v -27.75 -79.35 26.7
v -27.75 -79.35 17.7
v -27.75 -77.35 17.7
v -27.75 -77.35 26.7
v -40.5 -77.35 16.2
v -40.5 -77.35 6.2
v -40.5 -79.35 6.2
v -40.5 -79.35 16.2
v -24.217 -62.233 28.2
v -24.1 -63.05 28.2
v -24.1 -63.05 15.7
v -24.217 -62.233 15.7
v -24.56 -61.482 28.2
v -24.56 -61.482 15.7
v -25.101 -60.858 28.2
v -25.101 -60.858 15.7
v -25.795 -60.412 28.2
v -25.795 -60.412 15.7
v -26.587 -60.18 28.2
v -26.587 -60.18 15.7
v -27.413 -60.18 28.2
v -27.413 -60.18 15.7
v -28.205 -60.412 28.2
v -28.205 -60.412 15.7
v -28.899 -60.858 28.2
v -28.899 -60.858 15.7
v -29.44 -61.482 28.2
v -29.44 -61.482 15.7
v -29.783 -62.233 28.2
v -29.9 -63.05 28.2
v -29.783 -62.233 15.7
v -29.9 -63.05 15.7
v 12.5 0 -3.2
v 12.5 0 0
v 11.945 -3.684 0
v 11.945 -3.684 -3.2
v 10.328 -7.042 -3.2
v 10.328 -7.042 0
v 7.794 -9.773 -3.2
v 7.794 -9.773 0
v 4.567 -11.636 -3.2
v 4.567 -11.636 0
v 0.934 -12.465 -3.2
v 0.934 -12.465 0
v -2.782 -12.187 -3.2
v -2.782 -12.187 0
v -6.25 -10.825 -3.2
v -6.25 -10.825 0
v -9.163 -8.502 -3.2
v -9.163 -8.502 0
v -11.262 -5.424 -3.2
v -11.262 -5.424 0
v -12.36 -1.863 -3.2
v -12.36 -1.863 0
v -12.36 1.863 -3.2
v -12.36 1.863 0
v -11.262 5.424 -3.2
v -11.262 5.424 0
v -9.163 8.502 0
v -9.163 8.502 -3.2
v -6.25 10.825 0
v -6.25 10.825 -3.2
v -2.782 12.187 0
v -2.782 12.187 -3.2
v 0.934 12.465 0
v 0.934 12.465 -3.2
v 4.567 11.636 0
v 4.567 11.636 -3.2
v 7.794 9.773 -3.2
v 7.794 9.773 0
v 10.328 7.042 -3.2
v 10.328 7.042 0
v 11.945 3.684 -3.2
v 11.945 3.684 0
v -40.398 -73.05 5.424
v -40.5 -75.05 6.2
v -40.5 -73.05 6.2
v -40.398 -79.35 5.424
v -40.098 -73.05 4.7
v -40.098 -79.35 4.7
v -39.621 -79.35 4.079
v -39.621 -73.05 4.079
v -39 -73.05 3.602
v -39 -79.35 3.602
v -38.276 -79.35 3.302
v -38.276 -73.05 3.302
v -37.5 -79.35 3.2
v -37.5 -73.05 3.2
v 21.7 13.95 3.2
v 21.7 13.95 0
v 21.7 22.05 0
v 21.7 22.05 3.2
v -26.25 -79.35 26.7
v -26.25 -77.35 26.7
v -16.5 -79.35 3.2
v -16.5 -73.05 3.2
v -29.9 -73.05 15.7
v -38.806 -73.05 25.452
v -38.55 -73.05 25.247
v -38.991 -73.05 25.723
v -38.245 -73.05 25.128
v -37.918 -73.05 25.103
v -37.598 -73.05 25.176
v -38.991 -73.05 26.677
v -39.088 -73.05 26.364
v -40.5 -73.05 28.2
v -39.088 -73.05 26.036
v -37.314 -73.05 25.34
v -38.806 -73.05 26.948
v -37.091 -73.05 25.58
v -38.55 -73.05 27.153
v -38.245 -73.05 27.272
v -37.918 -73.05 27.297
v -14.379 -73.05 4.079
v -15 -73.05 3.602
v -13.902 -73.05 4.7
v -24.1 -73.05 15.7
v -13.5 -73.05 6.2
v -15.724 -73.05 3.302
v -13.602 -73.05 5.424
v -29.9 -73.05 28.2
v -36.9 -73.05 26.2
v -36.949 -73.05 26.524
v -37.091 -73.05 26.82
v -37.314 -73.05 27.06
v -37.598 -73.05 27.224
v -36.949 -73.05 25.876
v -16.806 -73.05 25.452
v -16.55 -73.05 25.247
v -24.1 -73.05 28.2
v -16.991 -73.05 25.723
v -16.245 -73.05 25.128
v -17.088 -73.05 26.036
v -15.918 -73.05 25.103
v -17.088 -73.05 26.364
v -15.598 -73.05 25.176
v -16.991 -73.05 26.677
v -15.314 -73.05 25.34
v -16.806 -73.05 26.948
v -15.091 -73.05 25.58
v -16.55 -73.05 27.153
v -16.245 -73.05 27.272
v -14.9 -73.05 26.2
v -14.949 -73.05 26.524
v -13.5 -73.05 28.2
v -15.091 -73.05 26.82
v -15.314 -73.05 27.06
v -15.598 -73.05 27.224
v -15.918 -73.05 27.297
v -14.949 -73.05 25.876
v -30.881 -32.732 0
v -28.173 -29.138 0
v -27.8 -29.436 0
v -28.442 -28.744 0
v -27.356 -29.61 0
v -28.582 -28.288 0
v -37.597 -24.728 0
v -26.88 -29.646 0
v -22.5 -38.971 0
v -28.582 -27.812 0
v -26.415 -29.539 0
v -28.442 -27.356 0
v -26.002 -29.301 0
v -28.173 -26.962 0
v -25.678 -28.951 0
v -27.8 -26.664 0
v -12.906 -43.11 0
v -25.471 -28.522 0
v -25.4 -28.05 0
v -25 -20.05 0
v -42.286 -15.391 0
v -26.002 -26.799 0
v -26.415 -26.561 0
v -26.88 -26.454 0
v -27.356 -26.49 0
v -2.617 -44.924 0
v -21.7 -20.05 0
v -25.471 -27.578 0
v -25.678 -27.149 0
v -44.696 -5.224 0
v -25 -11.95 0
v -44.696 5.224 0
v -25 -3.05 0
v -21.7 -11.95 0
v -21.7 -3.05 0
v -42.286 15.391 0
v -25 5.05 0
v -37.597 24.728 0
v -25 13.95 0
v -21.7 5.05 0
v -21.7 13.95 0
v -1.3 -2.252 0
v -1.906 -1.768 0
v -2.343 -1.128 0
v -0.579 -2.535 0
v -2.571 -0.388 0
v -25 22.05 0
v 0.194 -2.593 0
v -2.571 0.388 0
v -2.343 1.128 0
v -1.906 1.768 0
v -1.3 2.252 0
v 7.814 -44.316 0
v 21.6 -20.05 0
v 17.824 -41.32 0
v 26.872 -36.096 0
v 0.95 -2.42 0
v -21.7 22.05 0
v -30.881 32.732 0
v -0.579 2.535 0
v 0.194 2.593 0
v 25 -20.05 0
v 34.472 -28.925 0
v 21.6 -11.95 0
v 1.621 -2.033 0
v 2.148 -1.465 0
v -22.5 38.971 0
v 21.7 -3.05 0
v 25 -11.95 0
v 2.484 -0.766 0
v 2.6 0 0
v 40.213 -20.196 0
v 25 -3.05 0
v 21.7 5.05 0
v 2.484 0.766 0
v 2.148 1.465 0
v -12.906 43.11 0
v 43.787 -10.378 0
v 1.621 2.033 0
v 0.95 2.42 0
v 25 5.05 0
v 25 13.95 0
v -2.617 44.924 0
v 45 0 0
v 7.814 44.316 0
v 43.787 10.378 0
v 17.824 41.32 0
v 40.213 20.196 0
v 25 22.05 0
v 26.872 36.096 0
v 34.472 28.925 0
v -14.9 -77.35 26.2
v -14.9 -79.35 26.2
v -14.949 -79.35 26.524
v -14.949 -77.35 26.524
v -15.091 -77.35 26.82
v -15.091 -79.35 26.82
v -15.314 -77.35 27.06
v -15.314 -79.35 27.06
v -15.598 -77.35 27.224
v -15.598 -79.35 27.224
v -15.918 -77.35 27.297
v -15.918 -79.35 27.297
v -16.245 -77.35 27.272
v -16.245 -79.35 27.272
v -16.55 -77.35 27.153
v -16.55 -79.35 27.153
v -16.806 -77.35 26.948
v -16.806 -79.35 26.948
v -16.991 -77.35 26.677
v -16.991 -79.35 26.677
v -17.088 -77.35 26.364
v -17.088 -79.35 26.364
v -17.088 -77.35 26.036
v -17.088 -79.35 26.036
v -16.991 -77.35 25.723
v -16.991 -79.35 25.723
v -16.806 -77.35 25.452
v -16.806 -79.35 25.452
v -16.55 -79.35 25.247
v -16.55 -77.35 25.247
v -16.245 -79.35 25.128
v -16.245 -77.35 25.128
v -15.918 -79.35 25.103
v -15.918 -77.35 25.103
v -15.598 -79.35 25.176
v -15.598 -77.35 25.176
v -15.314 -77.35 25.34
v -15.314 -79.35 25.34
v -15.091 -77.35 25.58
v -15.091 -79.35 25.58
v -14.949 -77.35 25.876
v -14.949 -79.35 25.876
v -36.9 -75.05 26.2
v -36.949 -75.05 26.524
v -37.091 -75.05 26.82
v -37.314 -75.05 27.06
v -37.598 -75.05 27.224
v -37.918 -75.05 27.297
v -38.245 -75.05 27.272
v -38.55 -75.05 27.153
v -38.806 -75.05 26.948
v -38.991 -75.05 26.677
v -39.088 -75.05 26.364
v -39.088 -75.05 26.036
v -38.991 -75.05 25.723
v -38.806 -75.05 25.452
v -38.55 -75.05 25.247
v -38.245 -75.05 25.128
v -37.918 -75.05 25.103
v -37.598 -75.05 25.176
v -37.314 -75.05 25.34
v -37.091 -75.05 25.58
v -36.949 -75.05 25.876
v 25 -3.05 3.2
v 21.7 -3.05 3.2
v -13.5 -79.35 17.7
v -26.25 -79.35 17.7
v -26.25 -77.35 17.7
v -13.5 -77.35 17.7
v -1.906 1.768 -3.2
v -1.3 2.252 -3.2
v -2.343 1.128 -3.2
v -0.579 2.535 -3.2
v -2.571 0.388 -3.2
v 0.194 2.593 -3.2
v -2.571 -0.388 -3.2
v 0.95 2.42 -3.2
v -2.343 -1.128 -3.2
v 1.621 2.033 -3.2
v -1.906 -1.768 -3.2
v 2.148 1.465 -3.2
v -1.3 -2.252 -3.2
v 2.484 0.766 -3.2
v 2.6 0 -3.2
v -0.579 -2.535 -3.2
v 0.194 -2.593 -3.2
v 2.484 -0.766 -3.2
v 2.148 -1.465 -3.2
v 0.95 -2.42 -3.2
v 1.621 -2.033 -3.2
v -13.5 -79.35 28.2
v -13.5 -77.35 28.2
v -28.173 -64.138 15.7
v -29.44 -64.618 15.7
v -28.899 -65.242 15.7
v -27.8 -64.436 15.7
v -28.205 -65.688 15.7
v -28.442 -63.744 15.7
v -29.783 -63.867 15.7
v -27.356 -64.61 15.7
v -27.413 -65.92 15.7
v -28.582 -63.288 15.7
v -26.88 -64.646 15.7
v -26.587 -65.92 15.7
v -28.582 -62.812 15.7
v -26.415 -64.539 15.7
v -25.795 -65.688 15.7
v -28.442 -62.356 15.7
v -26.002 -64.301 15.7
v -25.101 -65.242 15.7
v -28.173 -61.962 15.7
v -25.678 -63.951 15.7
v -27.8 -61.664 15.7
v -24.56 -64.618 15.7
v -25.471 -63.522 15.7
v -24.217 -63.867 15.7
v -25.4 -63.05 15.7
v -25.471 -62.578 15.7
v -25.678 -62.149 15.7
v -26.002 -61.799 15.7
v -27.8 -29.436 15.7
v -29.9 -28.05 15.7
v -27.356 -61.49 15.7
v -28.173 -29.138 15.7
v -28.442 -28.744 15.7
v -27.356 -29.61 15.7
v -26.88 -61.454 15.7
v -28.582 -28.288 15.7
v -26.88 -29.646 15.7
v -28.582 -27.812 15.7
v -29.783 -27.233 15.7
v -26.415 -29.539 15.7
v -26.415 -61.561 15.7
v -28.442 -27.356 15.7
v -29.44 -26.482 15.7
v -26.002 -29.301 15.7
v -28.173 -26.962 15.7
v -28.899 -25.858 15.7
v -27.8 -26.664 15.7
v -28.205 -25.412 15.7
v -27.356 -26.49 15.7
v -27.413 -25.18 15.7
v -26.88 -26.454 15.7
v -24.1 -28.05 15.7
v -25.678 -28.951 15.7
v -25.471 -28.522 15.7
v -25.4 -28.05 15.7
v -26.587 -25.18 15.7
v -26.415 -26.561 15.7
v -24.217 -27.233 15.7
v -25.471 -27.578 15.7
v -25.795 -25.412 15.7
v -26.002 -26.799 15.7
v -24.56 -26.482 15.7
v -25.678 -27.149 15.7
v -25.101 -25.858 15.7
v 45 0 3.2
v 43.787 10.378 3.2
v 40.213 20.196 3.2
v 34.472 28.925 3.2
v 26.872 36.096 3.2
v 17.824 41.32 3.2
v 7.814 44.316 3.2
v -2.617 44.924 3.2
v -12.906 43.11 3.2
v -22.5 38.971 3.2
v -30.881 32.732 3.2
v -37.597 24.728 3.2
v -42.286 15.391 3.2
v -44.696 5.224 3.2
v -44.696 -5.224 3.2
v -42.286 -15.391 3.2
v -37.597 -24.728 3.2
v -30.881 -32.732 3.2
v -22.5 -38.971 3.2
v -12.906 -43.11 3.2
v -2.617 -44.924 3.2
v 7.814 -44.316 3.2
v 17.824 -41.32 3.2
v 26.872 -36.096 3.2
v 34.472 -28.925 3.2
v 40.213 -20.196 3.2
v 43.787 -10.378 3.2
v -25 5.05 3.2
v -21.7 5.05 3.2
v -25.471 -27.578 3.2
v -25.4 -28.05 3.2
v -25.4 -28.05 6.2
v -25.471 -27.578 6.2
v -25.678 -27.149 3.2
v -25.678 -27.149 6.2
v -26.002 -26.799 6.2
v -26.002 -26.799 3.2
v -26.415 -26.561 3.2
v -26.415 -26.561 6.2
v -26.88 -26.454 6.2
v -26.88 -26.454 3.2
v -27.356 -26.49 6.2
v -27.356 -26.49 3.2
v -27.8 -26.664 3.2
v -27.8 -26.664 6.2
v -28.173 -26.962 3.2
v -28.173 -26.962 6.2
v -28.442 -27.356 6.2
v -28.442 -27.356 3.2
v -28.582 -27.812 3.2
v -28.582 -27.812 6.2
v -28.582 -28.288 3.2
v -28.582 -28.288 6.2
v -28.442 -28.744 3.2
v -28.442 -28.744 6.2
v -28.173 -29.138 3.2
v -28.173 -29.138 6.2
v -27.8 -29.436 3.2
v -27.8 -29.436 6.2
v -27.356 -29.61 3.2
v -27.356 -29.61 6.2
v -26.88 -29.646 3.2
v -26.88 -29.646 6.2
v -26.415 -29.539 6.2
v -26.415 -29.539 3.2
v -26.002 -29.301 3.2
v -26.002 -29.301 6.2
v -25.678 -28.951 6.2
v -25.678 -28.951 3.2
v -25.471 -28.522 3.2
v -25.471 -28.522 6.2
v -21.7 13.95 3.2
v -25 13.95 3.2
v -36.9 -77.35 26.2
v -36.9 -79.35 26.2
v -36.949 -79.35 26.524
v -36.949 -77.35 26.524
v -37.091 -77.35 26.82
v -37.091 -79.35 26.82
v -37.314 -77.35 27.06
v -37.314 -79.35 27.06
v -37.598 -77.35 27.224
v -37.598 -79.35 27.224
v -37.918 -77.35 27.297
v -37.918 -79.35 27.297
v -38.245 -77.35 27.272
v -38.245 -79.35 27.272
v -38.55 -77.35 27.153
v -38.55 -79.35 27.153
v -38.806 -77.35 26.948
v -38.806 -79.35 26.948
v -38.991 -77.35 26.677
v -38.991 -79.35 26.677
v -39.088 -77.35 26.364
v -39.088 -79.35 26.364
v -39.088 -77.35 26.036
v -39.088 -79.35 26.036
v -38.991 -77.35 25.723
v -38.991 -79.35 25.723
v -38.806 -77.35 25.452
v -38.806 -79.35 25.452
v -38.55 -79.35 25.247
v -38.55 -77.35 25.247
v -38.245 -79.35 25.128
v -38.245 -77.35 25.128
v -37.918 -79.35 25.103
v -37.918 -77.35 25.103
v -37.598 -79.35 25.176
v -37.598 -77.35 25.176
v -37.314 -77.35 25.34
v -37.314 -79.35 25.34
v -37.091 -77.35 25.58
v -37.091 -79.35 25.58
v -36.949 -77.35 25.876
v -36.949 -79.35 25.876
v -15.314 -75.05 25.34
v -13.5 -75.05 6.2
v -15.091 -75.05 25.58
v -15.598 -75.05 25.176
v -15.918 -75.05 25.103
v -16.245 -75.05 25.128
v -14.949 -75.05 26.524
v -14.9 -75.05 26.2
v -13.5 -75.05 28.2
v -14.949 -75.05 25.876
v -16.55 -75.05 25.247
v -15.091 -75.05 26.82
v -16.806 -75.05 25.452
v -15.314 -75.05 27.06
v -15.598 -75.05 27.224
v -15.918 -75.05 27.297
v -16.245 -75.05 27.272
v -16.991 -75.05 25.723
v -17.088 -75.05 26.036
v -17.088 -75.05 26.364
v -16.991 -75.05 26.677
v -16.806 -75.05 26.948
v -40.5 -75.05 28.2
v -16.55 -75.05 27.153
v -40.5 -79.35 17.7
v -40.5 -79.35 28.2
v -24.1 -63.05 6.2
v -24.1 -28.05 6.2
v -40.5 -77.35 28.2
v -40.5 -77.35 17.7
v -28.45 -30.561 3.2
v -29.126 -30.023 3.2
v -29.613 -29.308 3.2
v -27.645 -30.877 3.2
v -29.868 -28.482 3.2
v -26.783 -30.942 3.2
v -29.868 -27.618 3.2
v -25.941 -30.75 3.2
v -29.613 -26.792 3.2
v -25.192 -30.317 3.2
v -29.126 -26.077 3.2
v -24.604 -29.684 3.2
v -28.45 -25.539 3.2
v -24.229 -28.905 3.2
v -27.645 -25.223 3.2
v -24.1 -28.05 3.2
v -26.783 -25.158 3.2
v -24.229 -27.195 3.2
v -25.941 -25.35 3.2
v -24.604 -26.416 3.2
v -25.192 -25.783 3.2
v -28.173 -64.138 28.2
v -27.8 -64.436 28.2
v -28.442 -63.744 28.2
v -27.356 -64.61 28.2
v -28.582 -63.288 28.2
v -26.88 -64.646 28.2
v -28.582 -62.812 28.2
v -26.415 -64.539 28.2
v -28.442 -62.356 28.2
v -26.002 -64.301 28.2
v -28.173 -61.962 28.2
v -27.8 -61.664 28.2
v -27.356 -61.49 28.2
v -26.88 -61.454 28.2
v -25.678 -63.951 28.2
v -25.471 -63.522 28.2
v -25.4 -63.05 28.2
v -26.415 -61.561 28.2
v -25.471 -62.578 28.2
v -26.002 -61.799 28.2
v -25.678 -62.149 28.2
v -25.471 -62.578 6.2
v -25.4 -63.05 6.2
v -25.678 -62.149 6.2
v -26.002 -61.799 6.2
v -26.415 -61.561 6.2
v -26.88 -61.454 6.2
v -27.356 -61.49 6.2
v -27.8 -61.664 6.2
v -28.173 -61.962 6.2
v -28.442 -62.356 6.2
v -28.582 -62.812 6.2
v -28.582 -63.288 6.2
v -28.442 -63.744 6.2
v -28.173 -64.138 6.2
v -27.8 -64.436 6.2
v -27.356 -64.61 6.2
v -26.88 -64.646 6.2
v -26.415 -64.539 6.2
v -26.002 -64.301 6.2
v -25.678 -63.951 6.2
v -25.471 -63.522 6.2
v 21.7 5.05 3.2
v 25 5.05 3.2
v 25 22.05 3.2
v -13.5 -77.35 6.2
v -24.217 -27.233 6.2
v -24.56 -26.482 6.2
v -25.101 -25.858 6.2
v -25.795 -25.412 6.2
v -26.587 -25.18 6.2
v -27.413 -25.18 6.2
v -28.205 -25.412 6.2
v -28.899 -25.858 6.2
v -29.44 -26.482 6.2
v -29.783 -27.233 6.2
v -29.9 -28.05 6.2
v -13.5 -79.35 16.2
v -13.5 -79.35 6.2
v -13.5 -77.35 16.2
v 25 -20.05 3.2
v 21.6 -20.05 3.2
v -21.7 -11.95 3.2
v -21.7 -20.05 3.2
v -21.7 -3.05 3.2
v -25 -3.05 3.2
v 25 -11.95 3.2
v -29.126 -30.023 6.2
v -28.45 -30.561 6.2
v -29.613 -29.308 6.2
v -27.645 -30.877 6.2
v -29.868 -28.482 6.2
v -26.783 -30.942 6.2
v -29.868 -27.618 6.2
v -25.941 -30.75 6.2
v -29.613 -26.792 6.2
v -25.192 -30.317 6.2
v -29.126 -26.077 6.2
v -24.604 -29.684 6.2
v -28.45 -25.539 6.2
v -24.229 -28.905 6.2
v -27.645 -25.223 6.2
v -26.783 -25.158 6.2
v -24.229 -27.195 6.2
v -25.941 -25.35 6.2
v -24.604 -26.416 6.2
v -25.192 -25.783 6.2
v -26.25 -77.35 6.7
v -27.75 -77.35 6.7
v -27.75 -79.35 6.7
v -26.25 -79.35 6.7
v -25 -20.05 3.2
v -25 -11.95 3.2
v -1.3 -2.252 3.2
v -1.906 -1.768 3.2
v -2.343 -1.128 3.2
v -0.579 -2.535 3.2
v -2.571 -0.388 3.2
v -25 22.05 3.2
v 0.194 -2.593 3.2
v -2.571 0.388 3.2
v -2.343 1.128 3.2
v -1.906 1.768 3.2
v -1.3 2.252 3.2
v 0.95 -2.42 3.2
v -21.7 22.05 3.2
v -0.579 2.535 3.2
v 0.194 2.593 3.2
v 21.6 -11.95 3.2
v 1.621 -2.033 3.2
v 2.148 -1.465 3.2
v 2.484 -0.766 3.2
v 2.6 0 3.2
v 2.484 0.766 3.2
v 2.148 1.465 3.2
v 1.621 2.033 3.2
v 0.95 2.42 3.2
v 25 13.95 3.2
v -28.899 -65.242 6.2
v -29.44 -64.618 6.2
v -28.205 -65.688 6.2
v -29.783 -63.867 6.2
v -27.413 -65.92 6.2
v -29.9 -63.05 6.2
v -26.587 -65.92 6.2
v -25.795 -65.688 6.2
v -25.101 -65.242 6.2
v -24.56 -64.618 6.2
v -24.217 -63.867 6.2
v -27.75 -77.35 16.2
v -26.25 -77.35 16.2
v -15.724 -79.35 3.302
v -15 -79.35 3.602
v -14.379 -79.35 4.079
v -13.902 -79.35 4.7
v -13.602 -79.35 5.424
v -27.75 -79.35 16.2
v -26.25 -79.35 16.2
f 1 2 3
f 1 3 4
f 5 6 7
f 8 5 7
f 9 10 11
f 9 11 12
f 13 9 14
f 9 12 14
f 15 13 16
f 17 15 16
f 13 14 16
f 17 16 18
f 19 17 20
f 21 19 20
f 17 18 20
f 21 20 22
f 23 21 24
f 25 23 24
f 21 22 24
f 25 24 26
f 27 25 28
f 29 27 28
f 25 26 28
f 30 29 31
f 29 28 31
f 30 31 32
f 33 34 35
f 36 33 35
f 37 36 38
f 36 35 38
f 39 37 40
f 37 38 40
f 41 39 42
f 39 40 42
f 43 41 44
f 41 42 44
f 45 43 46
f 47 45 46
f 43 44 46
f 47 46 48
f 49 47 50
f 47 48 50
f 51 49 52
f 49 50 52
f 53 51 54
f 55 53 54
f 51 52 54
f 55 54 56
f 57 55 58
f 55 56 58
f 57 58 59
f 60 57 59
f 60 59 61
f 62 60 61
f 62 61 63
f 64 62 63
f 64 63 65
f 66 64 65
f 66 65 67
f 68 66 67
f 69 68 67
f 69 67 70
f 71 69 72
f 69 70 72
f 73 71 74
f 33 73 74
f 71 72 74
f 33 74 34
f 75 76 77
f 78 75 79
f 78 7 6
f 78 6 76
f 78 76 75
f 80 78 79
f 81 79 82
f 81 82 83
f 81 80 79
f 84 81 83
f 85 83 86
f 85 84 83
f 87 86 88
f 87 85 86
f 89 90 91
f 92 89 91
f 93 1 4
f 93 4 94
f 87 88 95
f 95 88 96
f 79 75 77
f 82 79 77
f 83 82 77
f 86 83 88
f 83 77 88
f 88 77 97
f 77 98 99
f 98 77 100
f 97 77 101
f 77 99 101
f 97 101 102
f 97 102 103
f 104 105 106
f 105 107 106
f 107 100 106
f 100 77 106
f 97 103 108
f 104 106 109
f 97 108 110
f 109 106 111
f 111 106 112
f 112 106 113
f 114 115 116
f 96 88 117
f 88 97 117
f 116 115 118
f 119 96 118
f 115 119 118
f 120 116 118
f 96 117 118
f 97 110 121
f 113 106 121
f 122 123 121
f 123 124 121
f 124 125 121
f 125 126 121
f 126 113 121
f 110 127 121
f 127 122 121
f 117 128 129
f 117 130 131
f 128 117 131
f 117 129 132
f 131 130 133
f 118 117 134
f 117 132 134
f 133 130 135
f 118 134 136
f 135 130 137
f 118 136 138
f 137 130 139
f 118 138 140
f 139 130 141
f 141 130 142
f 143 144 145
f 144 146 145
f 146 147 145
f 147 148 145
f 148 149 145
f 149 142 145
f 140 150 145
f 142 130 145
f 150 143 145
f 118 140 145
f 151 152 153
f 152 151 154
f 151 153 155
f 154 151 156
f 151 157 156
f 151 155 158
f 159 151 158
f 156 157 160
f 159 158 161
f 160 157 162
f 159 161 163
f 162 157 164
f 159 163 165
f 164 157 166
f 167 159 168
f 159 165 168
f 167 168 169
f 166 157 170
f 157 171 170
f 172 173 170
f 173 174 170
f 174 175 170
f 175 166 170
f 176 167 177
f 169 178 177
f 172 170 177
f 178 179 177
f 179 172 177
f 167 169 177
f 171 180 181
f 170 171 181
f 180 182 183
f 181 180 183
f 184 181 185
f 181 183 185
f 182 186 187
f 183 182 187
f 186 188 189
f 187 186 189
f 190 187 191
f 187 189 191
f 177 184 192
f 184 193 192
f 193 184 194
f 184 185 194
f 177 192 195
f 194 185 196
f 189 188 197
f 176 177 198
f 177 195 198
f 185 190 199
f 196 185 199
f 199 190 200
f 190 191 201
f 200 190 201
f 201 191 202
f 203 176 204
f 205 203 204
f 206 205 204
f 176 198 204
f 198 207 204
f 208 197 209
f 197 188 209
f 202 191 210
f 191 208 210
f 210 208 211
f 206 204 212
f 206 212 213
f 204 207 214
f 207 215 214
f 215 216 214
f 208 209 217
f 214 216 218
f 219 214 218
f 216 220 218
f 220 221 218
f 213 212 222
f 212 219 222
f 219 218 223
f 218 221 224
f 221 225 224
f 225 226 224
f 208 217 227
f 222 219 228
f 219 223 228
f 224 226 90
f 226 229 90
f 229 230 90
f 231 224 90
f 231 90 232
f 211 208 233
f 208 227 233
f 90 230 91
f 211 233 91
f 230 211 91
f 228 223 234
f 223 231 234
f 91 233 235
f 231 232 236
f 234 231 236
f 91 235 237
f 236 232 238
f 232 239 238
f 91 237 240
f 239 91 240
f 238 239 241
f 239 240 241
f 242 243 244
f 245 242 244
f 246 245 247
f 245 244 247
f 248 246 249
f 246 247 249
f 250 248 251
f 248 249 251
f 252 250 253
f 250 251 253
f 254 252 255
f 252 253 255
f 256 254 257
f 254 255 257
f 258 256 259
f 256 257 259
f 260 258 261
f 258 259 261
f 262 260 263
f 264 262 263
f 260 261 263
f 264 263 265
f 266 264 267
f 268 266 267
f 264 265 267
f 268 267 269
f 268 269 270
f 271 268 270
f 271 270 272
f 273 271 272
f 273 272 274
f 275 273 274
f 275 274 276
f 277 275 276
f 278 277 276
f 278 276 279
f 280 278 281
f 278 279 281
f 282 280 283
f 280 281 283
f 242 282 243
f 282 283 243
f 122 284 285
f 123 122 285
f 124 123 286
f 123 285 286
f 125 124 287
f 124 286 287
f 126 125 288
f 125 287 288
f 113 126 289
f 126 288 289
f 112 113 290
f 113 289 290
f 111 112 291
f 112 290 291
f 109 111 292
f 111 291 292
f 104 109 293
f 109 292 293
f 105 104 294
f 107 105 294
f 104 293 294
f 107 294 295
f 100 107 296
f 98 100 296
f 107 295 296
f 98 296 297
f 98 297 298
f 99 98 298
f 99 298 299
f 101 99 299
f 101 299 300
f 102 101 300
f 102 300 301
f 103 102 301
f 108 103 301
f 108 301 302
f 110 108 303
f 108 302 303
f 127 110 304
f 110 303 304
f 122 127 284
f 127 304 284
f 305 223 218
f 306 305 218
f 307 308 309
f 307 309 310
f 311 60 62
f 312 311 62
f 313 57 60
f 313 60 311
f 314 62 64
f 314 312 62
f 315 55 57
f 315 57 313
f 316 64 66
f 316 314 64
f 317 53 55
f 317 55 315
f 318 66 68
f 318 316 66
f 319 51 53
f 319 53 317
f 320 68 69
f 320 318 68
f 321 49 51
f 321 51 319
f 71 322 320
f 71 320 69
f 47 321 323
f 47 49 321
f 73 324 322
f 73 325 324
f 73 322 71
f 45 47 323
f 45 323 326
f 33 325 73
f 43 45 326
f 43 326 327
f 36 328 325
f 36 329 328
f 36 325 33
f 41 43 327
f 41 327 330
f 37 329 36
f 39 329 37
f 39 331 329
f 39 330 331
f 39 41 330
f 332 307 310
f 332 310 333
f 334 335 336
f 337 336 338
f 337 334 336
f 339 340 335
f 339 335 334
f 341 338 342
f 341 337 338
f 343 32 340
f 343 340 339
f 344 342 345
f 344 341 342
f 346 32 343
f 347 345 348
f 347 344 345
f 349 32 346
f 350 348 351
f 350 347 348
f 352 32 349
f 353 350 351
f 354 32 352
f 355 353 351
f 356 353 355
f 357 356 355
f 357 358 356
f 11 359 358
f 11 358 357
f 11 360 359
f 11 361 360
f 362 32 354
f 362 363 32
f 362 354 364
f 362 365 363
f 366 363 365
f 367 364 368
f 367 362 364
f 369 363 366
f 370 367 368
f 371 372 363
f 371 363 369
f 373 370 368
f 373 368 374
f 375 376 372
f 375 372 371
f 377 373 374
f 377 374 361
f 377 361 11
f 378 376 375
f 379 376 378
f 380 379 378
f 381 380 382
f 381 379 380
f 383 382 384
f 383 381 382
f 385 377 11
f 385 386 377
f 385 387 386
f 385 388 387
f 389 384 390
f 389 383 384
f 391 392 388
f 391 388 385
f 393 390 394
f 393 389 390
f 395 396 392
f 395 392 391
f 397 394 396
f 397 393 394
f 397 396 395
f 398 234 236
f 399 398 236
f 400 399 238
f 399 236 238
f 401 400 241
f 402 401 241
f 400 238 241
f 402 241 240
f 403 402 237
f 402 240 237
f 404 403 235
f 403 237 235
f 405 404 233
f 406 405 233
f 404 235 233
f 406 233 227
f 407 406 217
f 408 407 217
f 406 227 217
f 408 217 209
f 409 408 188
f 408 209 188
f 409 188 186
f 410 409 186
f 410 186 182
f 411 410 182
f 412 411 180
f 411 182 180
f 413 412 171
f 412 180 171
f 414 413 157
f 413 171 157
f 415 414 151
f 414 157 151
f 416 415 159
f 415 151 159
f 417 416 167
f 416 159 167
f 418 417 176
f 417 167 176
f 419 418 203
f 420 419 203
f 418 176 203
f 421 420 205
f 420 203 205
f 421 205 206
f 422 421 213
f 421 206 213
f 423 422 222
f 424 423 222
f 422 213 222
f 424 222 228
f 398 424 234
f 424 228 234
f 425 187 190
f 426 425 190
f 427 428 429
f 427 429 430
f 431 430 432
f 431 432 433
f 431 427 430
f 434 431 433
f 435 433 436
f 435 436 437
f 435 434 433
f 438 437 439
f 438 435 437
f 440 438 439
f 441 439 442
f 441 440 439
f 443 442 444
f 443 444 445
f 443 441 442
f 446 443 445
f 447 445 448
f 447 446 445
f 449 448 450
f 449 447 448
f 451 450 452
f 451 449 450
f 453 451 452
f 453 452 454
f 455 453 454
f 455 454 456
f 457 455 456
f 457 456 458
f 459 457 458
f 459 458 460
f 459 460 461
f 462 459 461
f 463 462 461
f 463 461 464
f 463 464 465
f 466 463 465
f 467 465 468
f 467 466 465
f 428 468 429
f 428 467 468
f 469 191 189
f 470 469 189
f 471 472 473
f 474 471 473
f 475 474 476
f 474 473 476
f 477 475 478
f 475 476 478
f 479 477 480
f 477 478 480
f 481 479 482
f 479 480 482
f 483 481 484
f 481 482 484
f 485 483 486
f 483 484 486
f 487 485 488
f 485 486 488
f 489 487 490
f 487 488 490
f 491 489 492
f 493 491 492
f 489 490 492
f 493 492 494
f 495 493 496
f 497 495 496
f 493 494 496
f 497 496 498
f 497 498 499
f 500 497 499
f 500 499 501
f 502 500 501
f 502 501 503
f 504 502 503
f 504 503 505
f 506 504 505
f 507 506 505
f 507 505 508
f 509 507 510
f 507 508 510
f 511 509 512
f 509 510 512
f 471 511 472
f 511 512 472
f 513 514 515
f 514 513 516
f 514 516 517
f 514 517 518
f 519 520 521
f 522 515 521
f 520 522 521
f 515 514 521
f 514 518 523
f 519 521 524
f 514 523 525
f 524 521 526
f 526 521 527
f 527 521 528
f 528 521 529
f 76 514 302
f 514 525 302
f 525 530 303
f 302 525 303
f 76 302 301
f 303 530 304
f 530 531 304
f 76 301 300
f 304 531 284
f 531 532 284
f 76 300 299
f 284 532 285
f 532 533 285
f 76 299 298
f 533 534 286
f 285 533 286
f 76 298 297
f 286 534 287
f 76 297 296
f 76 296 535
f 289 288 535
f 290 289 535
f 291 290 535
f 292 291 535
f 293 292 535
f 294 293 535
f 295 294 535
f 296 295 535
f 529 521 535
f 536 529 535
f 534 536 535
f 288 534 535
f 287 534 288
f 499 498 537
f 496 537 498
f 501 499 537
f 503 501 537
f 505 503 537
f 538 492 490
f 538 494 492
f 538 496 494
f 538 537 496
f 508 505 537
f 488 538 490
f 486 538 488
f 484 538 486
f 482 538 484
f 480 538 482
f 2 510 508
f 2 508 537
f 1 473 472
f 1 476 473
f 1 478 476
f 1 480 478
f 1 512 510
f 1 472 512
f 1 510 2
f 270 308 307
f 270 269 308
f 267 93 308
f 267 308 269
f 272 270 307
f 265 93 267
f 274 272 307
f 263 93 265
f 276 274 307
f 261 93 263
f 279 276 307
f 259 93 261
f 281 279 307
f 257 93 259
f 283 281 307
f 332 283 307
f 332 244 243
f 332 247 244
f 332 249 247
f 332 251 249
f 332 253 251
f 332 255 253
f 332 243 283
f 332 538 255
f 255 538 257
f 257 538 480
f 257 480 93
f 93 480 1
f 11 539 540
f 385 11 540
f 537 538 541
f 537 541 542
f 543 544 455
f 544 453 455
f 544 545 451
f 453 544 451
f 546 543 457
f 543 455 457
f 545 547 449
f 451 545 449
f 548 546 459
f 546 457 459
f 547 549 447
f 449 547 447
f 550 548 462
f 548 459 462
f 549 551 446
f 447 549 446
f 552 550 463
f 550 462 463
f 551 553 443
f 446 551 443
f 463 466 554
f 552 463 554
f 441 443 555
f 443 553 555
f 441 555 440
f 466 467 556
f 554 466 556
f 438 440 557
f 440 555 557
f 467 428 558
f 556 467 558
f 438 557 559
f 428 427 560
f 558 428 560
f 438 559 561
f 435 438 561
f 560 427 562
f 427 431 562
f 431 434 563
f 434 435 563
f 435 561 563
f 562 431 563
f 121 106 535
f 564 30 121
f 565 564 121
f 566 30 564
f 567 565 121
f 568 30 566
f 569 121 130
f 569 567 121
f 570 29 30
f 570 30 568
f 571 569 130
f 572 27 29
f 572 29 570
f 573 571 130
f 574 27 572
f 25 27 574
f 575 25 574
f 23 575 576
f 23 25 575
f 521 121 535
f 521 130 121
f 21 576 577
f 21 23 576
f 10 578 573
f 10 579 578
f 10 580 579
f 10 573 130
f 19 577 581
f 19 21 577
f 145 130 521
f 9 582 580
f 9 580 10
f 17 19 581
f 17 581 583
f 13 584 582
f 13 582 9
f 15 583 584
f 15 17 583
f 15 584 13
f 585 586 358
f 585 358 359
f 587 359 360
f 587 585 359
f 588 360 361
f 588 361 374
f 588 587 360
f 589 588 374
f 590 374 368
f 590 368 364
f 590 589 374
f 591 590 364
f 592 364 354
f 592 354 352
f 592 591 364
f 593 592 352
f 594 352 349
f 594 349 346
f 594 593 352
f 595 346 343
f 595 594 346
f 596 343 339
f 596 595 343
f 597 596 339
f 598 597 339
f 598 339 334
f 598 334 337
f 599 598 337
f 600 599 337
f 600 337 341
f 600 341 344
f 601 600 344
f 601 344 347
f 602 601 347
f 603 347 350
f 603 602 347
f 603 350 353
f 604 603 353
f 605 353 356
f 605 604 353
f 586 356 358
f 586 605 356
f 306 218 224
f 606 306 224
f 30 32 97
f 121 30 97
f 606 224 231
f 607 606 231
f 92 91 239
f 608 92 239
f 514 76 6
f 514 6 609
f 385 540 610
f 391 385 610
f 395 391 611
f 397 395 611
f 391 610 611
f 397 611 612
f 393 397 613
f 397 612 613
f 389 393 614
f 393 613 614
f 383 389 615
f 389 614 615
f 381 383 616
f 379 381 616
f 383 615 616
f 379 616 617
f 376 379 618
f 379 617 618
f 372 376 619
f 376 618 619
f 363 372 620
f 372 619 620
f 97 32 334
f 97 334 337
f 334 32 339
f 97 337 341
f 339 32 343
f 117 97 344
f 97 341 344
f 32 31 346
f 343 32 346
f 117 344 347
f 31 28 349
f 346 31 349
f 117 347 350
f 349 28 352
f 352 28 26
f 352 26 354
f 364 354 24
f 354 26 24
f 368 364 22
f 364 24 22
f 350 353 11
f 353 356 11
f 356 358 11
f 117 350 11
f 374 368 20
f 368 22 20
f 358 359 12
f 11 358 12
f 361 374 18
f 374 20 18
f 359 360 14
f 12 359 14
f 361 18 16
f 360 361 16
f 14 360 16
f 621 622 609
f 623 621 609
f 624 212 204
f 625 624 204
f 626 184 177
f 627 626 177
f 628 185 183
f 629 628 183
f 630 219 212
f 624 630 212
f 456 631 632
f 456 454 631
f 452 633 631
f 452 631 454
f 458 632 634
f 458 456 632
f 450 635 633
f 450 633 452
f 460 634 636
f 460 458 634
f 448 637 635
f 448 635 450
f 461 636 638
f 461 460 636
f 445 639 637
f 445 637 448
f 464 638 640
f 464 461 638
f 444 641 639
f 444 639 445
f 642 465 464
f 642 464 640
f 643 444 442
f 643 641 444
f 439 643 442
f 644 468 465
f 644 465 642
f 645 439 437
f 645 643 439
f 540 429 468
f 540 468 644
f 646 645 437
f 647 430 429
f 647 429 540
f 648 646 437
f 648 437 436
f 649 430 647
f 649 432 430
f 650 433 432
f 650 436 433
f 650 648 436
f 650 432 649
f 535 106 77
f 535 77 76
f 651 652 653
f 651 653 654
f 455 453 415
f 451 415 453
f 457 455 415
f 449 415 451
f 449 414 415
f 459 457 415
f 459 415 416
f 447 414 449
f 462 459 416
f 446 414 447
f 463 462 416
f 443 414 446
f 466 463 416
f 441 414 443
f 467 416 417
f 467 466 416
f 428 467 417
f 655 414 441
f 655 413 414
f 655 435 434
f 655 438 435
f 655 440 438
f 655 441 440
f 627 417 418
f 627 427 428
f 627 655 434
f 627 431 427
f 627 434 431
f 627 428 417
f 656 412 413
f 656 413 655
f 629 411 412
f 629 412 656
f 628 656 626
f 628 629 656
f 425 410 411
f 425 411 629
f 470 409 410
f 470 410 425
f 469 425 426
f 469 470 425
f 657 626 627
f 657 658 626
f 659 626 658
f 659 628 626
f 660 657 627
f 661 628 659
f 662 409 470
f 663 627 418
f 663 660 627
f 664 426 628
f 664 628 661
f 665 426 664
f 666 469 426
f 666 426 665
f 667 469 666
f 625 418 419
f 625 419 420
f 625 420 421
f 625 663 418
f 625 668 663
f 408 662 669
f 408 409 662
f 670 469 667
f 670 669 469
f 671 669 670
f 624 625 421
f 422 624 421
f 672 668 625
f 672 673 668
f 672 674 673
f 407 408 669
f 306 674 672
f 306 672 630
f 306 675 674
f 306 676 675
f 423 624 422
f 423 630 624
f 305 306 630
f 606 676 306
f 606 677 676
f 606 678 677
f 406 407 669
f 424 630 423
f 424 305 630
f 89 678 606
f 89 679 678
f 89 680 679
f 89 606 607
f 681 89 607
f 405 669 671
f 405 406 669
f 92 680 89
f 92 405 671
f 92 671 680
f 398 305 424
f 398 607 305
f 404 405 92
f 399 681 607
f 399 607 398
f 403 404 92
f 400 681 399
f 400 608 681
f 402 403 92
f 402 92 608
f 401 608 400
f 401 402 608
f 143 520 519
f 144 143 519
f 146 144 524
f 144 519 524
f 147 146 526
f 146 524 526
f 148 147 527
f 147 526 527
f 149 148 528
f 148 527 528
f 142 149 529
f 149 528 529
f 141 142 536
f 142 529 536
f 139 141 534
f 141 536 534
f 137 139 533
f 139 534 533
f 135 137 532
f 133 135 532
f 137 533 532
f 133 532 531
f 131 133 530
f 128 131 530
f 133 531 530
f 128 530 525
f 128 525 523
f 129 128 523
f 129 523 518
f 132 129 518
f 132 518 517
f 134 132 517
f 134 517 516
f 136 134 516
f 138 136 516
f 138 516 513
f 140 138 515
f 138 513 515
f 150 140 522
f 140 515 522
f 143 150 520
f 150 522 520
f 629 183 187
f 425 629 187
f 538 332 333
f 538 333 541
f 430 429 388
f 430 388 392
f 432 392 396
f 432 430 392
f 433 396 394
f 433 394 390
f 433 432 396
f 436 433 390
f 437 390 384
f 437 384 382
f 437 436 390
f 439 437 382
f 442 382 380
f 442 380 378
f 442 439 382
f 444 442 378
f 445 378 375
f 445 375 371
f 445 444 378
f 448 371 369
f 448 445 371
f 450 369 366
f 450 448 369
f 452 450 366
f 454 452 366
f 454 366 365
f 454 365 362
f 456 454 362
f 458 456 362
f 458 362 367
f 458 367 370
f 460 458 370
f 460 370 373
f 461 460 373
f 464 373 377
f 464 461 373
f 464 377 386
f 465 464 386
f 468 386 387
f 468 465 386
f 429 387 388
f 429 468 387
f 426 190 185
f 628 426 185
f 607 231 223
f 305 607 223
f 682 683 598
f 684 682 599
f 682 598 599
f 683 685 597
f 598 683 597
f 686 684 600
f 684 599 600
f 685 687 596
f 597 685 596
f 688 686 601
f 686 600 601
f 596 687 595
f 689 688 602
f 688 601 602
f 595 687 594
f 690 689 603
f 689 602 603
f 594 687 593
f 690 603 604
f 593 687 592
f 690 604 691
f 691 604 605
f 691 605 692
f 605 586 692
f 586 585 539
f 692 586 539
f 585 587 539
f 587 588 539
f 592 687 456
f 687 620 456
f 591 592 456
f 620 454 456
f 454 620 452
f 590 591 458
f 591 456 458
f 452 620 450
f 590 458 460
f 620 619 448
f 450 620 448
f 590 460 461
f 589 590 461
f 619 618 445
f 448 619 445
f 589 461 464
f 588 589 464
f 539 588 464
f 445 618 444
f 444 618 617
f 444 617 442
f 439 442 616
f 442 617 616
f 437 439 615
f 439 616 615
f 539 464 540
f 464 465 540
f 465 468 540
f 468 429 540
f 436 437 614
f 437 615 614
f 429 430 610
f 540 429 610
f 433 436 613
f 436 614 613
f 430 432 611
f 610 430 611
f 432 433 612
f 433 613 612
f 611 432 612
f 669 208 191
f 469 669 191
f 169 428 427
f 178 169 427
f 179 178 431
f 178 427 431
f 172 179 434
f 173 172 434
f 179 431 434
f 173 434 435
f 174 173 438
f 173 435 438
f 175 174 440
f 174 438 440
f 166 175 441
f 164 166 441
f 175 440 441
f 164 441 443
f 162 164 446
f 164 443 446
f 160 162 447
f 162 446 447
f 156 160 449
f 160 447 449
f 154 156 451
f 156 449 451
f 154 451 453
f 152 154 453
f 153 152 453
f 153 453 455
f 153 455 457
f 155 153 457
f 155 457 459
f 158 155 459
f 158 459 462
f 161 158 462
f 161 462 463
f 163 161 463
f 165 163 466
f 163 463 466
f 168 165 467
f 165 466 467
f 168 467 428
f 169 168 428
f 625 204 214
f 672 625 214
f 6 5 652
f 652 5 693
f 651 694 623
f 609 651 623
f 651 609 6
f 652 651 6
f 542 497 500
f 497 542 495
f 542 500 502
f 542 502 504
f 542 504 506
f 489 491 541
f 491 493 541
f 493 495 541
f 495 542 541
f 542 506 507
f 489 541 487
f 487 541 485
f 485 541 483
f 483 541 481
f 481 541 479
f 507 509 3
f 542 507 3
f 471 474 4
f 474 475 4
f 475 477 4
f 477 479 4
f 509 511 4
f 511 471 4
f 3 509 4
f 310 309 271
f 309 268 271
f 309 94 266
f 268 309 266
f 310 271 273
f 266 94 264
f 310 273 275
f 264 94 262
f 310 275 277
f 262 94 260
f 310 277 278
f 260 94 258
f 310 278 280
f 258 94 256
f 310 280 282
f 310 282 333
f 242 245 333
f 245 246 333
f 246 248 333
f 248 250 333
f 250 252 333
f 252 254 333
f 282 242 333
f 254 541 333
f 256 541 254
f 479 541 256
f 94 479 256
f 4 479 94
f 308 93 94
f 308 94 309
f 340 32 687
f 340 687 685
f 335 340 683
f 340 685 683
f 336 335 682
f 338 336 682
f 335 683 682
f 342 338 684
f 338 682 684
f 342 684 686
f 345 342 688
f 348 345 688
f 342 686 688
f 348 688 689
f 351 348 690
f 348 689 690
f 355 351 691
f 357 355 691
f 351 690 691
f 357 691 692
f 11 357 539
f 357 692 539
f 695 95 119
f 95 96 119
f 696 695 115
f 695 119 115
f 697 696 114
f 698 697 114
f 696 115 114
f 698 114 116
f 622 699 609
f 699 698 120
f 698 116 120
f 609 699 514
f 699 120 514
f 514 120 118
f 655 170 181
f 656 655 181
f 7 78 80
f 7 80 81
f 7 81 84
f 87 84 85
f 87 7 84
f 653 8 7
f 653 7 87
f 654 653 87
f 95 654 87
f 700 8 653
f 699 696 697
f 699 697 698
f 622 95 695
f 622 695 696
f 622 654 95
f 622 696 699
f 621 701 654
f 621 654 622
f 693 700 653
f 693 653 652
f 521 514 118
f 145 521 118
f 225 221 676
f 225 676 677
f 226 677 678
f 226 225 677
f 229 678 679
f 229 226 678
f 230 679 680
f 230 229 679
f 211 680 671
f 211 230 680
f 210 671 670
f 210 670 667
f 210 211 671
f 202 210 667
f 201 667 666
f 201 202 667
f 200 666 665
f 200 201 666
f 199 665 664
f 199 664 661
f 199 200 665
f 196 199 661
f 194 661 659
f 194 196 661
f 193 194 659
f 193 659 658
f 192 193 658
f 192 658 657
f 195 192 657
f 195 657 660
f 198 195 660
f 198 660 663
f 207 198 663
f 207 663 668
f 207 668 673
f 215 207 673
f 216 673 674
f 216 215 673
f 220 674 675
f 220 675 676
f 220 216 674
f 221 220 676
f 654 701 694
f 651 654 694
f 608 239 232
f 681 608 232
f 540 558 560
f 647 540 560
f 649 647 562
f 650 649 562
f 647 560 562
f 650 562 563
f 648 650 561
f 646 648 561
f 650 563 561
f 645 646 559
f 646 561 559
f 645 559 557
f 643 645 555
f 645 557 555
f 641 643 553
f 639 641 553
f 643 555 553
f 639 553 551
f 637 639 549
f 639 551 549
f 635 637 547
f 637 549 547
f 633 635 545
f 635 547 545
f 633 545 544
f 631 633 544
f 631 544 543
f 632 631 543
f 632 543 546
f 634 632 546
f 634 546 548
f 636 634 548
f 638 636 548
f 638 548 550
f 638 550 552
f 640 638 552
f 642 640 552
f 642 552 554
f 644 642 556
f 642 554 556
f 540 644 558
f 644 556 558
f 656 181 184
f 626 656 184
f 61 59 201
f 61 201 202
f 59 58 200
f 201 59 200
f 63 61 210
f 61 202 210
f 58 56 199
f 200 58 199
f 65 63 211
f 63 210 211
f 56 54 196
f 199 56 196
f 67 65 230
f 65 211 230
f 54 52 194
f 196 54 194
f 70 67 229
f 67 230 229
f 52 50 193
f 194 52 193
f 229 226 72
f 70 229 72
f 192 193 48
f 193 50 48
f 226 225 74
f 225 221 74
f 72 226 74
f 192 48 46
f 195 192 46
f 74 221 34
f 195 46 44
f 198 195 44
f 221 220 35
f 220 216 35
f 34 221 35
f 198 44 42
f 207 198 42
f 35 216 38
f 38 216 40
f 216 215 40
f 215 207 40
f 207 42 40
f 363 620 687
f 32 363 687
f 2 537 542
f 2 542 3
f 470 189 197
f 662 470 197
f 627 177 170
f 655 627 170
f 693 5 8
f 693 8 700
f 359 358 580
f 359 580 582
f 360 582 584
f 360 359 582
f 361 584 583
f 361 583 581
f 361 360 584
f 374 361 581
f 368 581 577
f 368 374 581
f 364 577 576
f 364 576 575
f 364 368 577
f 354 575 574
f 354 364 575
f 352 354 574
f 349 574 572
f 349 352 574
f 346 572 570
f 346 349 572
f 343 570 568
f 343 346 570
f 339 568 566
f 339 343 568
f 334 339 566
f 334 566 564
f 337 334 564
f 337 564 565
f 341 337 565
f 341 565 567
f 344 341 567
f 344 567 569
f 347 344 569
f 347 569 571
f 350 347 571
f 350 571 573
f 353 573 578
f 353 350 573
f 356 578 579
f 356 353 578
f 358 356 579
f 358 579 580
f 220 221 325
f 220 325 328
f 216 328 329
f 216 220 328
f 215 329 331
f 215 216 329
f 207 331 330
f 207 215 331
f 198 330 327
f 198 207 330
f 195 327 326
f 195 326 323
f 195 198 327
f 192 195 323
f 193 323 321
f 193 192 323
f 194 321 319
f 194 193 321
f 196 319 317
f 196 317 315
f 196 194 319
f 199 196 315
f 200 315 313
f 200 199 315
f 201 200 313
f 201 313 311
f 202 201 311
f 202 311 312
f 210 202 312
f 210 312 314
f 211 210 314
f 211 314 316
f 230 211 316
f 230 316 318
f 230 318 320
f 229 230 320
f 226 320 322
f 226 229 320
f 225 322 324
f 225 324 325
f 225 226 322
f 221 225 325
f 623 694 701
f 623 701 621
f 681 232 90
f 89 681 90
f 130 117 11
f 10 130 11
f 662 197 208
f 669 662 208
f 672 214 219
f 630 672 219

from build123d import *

# Parameters (mm, degrees)
F0_R      = 2.6
F1_DEPTH  = 3.2
F2_R      = 45
F2_R_2    = 35.3553390593
F3_DEPTH  = 3.2
F4_R      = 1.6
F5_DEPTH  = 3.2
F4_R_2    = 2.9
F6_DEPTH  = 2.5
F7_DEPTH  = 12
F9_DEPTH  = 3
F10_R     = 1.6
F11_DEPTH = 9.5
F12_R     = 12.5
F12_R_2   = 2.6
F13_DEPTH = 3.2
F14_R     = 1.6
F15_DEPTH = 12.5
F16_W     = 27
F16_H     = 2
F16_W_2   = 12.75
F16_W_3   = 1.5
F17_DEPTH = 25
F18_R     = 3
F19_DEPTH = 22
F20_DEPTH = 12
F21_DEPTH = 21.5
F22_R     = 1.1
F23_DEPTH = 2
F24_R     = 1.1
F25_DEPTH = 2


# Not quite as in the source:
# - a feature names something its author has since deleted; it is built from what else it names


with BuildPart() as f1:
    # F0 (on Top) → F1 (new body)
    with BuildSketch(Plane.XY):
        with BuildLine():
            ThreePointArc((25, -25), (32.6640741219, -13.5299025037), (35.3553390593, 0))
            ThreePointArc((35.3553390593, 0), (32.6640741219, 13.5299025037), (25, 25))
            Line((25, 25), (25, 22.05))
            Line((25, 22.05), (25, 13.95))
            Line((25, 13.95), (25, 5.05))
            Line((25, 5.05), (25, -3.05))
            Line((25, -3.05), (25, -11.95))
            Line((25, -11.95), (25, -20.05))
            Line((25, -20.05), (25, -25))
        make_face()
        with BuildLine():
            Line((-25, 25), (25, 25))
            ThreePointArc((25, 25), (0, 35.3553390593), (-25, 25))
        make_face()
        Polygon((25, 22.05), (25, 25), (-25, 25), (-25, 22.05), (-21.7, 22.05), (-21.7, 13.95), (-25, 13.95), (-25, 5.05), (-21.7, 5.05), (-21.7, -3.05), (-25, -3.05), (-25, -11.95), (-21.7, -11.95), (-21.7, -20.05), (-25, -20.05), (-25, -25), (25, -25), (25, -20.05), (21.6, -20.05), (21.6, -11.95), (25, -11.95), (25, -3.05), (21.7, -3.05), (21.7, 5.05), (25, 5.05), (25, 13.95), (21.7, 13.95), (21.7, 22.05), align=None)
        Circle(F0_R, mode=Mode.SUBTRACT)
        with BuildLine():
            ThreePointArc((-25, -25), (0, -35.3553390593), (25, -25))
            Line((25, -25), (-25, -25))
        make_face()
        with BuildLine():
            Line((-25, 22.05), (-25, 25))
            ThreePointArc((-25, 25), (-35.3553390593, 0), (-25, -25))
            Line((-25, -25), (-25, -20.05))
            Line((-25, -20.05), (-25, -11.95))
            Line((-25, -11.95), (-25, -3.05))
            Line((-25, -3.05), (-25, 5.05))
            Line((-25, 5.05), (-25, 13.95))
            Line((-25, 13.95), (-25, 22.05))
        make_face()
    extrude(amount=F1_DEPTH)

    # F2 (on Top) → F3 (join, through all)
    with BuildSketch(Plane.XY):
        Circle(F2_R)
        Circle(F2_R_2, mode=Mode.SUBTRACT)
    extrude(amount=F3_DEPTH)

    # F4 (on face) → F5 (cut, through all)
    with BuildSketch(Plane.XY.offset(3.2)):
        with Locations((-27, -28.05)):
            Circle(F4_R)
    extrude(amount=-F5_DEPTH, mode=Mode.SUBTRACT)


with BuildPart() as f6:
    # F4 (on face) → F6 (new body)
    with BuildSketch(Plane.XY.offset(3.2)):
        with Locations((-27, -28.05)):
            Circle(F4_R_2)
        with Locations((-27, -28.05)):
            Circle(F4_R, mode=Mode.SUBTRACT)
    extrude(amount=F6_DEPTH)


with BuildPart() as f7:
    # F4 (on face) → F7 (new body)
    with BuildSketch(Plane.XY.offset(3.2)):
        with Locations((-27, -28.05)):
            Circle(F4_R_2)
        with Locations((-27, -28.05)):
            Circle(F4_R, mode=Mode.SUBTRACT)
    extrude(amount=F7_DEPTH)


with BuildPart() as f9:
    # F4 (on face) → F9 (new body)
    with BuildSketch(Plane.XY.offset(3.2)):
        with Locations((-27, -28.05)):
            Circle(F4_R_2)
        with Locations((-27, -28.05)):
            Circle(F4_R, mode=Mode.SUBTRACT)
    extrude(amount=F9_DEPTH)


with BuildPart() as f11:
    # F10 (on face) → F11 (new body)
    with BuildSketch(Plane.XY.offset(6.2)):
        with BuildLine():
            ThreePointArc((-29.9, -28.05), (-27, -30.95), (-24.1, -28.05))
            ThreePointArc((-24.1, -28.05), (-27, -25.15), (-29.9, -28.05))
        make_face()
        with Locations((-27, -28.05)):
            Circle(F10_R, mode=Mode.SUBTRACT)
        with BuildLine():
            Line((-24.1, -63.05), (-24.1, -28.05))
            ThreePointArc((-24.1, -28.05), (-27, -30.95), (-29.9, -28.05))
            Line((-29.9, -28.05), (-29.9, -63.05))
            ThreePointArc((-29.9, -63.05), (-27, -60.15), (-24.1, -63.05))
        make_face()
        with BuildLine():
            ThreePointArc((-29.9, -63.05), (-27, -65.95), (-24.1, -63.05))
            ThreePointArc((-24.1, -63.05), (-27, -60.15), (-29.9, -63.05))
        make_face()
        with Locations((-27, -63.05)):
            Circle(F10_R, mode=Mode.SUBTRACT)
    extrude(amount=F11_DEPTH)


with BuildPart() as f13:
    # F12 (on face) → F13 (new body)
    with BuildSketch(Plane(origin=(0, 0, 0), x_dir=(1, 0, 0), z_dir=(0, 0, -1))):
        Circle(F12_R)
        Circle(F12_R_2, mode=Mode.SUBTRACT)
    extrude(amount=F13_DEPTH)


with BuildPart() as f15:
    # F14 (on face) → F15 (new body)
    with BuildSketch(Plane.XY.offset(15.7)):
        with BuildLine():
            ThreePointArc((-29.9, -63.05), (-27, -65.95), (-24.1, -63.05))
            ThreePointArc((-24.1, -63.05), (-27, -60.15), (-29.9, -63.05))
        make_face()
        with Locations((-27, -63.05)):
            Circle(F14_R, mode=Mode.SUBTRACT)
        with BuildLine():
            Line((-24.1, -73.05), (-24.1, -63.05))
            ThreePointArc((-24.1, -63.05), (-27, -65.95), (-29.9, -63.05))
            Line((-29.9, -63.05), (-29.9, -73.05))
            Line((-29.9, -73.05), (-24.1, -73.05))
        make_face()
    extrude(amount=F15_DEPTH)

    # F16 (on face) → F17 (join)
    with BuildSketch(Plane.XY.offset(28.2)):
        with Locations((-27, -74.05)):
            Rectangle(F16_W, F16_H)
        Polygon((-13.5, -75.05), (-40.5, -75.05), (-40.5, -77.35), (-27.75, -77.35), (-26.25, -77.35), (-13.5, -77.35), align=None)
        with Locations((-34.125, -78.35)):
            Rectangle(F16_W_2, F16_H)
        with Locations((-19.875, -78.35)):
            Rectangle(F16_W_2, F16_H)
        with Locations((-27, -78.35)):
            Rectangle(F16_W_3, F16_H)
    extrude(amount=-F17_DEPTH)

    # F18
    f18_edges = [f15.edges().sort_by_distance(p)[0] for p in [
        (-40.5, -76.2, 3.2),
        (-13.5, -76.2, 3.2),
    ]]
    fillet(f18_edges, radius=F18_R)

    # F16 (on face) → F19 (cut)
    with BuildSketch(Plane.XY.offset(28.2)):
        Polygon((-13.5, -75.05), (-40.5, -75.05), (-40.5, -77.35), (-27.75, -77.35), (-26.25, -77.35), (-13.5, -77.35), align=None)
    extrude(amount=-F19_DEPTH, mode=Mode.SUBTRACT)

    # F16 (on face) → F20 (cut)
    with BuildSketch(Plane.XY.offset(28.2)):
        with Locations((-34.125, -78.35)):
            Rectangle(F16_W_2, F16_H)
        with Locations((-27, -78.35)):
            Rectangle(F16_W_3, F16_H)
        with Locations((-19.875, -78.35)):
            Rectangle(F16_W_2, F16_H)
    extrude(amount=-F20_DEPTH, mode=Mode.SUBTRACT)

    # F16 (on face) → F21 (cut)
    with BuildSketch(Plane.XY.offset(28.2)):
        with Locations((-27, -78.35)):
            Rectangle(F16_W_3, F16_H)
    extrude(amount=-F21_DEPTH, mode=Mode.SUBTRACT)

    # F24 (on face) → F25 (cut, through all)
    with BuildSketch(Plane.XZ.offset(75.05)):
        with Locations((-38, 26.2)):
            Circle(F24_R)
        with Locations((-16, 26.2)):
            Circle(F24_R)
    extrude(amount=-F25_DEPTH, mode=Mode.SUBTRACT)


with BuildPart() as f23:
    # F22 (on face) → F23 (new body, through all)
    with BuildSketch(Plane.XZ.offset(79.35)):
        Polygon((-40.5, 17.7), (-27.75, 17.7), (-27.75, 26.7), (-26.25, 26.7), (-26.25, 17.7), (-13.5, 17.7), (-13.5, 28.2), (-40.5, 28.2), align=None)
        with Locations((-38, 26.2)):
            Circle(F22_R, mode=Mode.SUBTRACT)
        with Locations((-16, 26.2)):
            Circle(F22_R, mode=Mode.SUBTRACT)
    extrude(amount=-F23_DEPTH)


solid = Compound([f1.part, f9.part, f11.part, f13.part, f15.part, f23.part])
